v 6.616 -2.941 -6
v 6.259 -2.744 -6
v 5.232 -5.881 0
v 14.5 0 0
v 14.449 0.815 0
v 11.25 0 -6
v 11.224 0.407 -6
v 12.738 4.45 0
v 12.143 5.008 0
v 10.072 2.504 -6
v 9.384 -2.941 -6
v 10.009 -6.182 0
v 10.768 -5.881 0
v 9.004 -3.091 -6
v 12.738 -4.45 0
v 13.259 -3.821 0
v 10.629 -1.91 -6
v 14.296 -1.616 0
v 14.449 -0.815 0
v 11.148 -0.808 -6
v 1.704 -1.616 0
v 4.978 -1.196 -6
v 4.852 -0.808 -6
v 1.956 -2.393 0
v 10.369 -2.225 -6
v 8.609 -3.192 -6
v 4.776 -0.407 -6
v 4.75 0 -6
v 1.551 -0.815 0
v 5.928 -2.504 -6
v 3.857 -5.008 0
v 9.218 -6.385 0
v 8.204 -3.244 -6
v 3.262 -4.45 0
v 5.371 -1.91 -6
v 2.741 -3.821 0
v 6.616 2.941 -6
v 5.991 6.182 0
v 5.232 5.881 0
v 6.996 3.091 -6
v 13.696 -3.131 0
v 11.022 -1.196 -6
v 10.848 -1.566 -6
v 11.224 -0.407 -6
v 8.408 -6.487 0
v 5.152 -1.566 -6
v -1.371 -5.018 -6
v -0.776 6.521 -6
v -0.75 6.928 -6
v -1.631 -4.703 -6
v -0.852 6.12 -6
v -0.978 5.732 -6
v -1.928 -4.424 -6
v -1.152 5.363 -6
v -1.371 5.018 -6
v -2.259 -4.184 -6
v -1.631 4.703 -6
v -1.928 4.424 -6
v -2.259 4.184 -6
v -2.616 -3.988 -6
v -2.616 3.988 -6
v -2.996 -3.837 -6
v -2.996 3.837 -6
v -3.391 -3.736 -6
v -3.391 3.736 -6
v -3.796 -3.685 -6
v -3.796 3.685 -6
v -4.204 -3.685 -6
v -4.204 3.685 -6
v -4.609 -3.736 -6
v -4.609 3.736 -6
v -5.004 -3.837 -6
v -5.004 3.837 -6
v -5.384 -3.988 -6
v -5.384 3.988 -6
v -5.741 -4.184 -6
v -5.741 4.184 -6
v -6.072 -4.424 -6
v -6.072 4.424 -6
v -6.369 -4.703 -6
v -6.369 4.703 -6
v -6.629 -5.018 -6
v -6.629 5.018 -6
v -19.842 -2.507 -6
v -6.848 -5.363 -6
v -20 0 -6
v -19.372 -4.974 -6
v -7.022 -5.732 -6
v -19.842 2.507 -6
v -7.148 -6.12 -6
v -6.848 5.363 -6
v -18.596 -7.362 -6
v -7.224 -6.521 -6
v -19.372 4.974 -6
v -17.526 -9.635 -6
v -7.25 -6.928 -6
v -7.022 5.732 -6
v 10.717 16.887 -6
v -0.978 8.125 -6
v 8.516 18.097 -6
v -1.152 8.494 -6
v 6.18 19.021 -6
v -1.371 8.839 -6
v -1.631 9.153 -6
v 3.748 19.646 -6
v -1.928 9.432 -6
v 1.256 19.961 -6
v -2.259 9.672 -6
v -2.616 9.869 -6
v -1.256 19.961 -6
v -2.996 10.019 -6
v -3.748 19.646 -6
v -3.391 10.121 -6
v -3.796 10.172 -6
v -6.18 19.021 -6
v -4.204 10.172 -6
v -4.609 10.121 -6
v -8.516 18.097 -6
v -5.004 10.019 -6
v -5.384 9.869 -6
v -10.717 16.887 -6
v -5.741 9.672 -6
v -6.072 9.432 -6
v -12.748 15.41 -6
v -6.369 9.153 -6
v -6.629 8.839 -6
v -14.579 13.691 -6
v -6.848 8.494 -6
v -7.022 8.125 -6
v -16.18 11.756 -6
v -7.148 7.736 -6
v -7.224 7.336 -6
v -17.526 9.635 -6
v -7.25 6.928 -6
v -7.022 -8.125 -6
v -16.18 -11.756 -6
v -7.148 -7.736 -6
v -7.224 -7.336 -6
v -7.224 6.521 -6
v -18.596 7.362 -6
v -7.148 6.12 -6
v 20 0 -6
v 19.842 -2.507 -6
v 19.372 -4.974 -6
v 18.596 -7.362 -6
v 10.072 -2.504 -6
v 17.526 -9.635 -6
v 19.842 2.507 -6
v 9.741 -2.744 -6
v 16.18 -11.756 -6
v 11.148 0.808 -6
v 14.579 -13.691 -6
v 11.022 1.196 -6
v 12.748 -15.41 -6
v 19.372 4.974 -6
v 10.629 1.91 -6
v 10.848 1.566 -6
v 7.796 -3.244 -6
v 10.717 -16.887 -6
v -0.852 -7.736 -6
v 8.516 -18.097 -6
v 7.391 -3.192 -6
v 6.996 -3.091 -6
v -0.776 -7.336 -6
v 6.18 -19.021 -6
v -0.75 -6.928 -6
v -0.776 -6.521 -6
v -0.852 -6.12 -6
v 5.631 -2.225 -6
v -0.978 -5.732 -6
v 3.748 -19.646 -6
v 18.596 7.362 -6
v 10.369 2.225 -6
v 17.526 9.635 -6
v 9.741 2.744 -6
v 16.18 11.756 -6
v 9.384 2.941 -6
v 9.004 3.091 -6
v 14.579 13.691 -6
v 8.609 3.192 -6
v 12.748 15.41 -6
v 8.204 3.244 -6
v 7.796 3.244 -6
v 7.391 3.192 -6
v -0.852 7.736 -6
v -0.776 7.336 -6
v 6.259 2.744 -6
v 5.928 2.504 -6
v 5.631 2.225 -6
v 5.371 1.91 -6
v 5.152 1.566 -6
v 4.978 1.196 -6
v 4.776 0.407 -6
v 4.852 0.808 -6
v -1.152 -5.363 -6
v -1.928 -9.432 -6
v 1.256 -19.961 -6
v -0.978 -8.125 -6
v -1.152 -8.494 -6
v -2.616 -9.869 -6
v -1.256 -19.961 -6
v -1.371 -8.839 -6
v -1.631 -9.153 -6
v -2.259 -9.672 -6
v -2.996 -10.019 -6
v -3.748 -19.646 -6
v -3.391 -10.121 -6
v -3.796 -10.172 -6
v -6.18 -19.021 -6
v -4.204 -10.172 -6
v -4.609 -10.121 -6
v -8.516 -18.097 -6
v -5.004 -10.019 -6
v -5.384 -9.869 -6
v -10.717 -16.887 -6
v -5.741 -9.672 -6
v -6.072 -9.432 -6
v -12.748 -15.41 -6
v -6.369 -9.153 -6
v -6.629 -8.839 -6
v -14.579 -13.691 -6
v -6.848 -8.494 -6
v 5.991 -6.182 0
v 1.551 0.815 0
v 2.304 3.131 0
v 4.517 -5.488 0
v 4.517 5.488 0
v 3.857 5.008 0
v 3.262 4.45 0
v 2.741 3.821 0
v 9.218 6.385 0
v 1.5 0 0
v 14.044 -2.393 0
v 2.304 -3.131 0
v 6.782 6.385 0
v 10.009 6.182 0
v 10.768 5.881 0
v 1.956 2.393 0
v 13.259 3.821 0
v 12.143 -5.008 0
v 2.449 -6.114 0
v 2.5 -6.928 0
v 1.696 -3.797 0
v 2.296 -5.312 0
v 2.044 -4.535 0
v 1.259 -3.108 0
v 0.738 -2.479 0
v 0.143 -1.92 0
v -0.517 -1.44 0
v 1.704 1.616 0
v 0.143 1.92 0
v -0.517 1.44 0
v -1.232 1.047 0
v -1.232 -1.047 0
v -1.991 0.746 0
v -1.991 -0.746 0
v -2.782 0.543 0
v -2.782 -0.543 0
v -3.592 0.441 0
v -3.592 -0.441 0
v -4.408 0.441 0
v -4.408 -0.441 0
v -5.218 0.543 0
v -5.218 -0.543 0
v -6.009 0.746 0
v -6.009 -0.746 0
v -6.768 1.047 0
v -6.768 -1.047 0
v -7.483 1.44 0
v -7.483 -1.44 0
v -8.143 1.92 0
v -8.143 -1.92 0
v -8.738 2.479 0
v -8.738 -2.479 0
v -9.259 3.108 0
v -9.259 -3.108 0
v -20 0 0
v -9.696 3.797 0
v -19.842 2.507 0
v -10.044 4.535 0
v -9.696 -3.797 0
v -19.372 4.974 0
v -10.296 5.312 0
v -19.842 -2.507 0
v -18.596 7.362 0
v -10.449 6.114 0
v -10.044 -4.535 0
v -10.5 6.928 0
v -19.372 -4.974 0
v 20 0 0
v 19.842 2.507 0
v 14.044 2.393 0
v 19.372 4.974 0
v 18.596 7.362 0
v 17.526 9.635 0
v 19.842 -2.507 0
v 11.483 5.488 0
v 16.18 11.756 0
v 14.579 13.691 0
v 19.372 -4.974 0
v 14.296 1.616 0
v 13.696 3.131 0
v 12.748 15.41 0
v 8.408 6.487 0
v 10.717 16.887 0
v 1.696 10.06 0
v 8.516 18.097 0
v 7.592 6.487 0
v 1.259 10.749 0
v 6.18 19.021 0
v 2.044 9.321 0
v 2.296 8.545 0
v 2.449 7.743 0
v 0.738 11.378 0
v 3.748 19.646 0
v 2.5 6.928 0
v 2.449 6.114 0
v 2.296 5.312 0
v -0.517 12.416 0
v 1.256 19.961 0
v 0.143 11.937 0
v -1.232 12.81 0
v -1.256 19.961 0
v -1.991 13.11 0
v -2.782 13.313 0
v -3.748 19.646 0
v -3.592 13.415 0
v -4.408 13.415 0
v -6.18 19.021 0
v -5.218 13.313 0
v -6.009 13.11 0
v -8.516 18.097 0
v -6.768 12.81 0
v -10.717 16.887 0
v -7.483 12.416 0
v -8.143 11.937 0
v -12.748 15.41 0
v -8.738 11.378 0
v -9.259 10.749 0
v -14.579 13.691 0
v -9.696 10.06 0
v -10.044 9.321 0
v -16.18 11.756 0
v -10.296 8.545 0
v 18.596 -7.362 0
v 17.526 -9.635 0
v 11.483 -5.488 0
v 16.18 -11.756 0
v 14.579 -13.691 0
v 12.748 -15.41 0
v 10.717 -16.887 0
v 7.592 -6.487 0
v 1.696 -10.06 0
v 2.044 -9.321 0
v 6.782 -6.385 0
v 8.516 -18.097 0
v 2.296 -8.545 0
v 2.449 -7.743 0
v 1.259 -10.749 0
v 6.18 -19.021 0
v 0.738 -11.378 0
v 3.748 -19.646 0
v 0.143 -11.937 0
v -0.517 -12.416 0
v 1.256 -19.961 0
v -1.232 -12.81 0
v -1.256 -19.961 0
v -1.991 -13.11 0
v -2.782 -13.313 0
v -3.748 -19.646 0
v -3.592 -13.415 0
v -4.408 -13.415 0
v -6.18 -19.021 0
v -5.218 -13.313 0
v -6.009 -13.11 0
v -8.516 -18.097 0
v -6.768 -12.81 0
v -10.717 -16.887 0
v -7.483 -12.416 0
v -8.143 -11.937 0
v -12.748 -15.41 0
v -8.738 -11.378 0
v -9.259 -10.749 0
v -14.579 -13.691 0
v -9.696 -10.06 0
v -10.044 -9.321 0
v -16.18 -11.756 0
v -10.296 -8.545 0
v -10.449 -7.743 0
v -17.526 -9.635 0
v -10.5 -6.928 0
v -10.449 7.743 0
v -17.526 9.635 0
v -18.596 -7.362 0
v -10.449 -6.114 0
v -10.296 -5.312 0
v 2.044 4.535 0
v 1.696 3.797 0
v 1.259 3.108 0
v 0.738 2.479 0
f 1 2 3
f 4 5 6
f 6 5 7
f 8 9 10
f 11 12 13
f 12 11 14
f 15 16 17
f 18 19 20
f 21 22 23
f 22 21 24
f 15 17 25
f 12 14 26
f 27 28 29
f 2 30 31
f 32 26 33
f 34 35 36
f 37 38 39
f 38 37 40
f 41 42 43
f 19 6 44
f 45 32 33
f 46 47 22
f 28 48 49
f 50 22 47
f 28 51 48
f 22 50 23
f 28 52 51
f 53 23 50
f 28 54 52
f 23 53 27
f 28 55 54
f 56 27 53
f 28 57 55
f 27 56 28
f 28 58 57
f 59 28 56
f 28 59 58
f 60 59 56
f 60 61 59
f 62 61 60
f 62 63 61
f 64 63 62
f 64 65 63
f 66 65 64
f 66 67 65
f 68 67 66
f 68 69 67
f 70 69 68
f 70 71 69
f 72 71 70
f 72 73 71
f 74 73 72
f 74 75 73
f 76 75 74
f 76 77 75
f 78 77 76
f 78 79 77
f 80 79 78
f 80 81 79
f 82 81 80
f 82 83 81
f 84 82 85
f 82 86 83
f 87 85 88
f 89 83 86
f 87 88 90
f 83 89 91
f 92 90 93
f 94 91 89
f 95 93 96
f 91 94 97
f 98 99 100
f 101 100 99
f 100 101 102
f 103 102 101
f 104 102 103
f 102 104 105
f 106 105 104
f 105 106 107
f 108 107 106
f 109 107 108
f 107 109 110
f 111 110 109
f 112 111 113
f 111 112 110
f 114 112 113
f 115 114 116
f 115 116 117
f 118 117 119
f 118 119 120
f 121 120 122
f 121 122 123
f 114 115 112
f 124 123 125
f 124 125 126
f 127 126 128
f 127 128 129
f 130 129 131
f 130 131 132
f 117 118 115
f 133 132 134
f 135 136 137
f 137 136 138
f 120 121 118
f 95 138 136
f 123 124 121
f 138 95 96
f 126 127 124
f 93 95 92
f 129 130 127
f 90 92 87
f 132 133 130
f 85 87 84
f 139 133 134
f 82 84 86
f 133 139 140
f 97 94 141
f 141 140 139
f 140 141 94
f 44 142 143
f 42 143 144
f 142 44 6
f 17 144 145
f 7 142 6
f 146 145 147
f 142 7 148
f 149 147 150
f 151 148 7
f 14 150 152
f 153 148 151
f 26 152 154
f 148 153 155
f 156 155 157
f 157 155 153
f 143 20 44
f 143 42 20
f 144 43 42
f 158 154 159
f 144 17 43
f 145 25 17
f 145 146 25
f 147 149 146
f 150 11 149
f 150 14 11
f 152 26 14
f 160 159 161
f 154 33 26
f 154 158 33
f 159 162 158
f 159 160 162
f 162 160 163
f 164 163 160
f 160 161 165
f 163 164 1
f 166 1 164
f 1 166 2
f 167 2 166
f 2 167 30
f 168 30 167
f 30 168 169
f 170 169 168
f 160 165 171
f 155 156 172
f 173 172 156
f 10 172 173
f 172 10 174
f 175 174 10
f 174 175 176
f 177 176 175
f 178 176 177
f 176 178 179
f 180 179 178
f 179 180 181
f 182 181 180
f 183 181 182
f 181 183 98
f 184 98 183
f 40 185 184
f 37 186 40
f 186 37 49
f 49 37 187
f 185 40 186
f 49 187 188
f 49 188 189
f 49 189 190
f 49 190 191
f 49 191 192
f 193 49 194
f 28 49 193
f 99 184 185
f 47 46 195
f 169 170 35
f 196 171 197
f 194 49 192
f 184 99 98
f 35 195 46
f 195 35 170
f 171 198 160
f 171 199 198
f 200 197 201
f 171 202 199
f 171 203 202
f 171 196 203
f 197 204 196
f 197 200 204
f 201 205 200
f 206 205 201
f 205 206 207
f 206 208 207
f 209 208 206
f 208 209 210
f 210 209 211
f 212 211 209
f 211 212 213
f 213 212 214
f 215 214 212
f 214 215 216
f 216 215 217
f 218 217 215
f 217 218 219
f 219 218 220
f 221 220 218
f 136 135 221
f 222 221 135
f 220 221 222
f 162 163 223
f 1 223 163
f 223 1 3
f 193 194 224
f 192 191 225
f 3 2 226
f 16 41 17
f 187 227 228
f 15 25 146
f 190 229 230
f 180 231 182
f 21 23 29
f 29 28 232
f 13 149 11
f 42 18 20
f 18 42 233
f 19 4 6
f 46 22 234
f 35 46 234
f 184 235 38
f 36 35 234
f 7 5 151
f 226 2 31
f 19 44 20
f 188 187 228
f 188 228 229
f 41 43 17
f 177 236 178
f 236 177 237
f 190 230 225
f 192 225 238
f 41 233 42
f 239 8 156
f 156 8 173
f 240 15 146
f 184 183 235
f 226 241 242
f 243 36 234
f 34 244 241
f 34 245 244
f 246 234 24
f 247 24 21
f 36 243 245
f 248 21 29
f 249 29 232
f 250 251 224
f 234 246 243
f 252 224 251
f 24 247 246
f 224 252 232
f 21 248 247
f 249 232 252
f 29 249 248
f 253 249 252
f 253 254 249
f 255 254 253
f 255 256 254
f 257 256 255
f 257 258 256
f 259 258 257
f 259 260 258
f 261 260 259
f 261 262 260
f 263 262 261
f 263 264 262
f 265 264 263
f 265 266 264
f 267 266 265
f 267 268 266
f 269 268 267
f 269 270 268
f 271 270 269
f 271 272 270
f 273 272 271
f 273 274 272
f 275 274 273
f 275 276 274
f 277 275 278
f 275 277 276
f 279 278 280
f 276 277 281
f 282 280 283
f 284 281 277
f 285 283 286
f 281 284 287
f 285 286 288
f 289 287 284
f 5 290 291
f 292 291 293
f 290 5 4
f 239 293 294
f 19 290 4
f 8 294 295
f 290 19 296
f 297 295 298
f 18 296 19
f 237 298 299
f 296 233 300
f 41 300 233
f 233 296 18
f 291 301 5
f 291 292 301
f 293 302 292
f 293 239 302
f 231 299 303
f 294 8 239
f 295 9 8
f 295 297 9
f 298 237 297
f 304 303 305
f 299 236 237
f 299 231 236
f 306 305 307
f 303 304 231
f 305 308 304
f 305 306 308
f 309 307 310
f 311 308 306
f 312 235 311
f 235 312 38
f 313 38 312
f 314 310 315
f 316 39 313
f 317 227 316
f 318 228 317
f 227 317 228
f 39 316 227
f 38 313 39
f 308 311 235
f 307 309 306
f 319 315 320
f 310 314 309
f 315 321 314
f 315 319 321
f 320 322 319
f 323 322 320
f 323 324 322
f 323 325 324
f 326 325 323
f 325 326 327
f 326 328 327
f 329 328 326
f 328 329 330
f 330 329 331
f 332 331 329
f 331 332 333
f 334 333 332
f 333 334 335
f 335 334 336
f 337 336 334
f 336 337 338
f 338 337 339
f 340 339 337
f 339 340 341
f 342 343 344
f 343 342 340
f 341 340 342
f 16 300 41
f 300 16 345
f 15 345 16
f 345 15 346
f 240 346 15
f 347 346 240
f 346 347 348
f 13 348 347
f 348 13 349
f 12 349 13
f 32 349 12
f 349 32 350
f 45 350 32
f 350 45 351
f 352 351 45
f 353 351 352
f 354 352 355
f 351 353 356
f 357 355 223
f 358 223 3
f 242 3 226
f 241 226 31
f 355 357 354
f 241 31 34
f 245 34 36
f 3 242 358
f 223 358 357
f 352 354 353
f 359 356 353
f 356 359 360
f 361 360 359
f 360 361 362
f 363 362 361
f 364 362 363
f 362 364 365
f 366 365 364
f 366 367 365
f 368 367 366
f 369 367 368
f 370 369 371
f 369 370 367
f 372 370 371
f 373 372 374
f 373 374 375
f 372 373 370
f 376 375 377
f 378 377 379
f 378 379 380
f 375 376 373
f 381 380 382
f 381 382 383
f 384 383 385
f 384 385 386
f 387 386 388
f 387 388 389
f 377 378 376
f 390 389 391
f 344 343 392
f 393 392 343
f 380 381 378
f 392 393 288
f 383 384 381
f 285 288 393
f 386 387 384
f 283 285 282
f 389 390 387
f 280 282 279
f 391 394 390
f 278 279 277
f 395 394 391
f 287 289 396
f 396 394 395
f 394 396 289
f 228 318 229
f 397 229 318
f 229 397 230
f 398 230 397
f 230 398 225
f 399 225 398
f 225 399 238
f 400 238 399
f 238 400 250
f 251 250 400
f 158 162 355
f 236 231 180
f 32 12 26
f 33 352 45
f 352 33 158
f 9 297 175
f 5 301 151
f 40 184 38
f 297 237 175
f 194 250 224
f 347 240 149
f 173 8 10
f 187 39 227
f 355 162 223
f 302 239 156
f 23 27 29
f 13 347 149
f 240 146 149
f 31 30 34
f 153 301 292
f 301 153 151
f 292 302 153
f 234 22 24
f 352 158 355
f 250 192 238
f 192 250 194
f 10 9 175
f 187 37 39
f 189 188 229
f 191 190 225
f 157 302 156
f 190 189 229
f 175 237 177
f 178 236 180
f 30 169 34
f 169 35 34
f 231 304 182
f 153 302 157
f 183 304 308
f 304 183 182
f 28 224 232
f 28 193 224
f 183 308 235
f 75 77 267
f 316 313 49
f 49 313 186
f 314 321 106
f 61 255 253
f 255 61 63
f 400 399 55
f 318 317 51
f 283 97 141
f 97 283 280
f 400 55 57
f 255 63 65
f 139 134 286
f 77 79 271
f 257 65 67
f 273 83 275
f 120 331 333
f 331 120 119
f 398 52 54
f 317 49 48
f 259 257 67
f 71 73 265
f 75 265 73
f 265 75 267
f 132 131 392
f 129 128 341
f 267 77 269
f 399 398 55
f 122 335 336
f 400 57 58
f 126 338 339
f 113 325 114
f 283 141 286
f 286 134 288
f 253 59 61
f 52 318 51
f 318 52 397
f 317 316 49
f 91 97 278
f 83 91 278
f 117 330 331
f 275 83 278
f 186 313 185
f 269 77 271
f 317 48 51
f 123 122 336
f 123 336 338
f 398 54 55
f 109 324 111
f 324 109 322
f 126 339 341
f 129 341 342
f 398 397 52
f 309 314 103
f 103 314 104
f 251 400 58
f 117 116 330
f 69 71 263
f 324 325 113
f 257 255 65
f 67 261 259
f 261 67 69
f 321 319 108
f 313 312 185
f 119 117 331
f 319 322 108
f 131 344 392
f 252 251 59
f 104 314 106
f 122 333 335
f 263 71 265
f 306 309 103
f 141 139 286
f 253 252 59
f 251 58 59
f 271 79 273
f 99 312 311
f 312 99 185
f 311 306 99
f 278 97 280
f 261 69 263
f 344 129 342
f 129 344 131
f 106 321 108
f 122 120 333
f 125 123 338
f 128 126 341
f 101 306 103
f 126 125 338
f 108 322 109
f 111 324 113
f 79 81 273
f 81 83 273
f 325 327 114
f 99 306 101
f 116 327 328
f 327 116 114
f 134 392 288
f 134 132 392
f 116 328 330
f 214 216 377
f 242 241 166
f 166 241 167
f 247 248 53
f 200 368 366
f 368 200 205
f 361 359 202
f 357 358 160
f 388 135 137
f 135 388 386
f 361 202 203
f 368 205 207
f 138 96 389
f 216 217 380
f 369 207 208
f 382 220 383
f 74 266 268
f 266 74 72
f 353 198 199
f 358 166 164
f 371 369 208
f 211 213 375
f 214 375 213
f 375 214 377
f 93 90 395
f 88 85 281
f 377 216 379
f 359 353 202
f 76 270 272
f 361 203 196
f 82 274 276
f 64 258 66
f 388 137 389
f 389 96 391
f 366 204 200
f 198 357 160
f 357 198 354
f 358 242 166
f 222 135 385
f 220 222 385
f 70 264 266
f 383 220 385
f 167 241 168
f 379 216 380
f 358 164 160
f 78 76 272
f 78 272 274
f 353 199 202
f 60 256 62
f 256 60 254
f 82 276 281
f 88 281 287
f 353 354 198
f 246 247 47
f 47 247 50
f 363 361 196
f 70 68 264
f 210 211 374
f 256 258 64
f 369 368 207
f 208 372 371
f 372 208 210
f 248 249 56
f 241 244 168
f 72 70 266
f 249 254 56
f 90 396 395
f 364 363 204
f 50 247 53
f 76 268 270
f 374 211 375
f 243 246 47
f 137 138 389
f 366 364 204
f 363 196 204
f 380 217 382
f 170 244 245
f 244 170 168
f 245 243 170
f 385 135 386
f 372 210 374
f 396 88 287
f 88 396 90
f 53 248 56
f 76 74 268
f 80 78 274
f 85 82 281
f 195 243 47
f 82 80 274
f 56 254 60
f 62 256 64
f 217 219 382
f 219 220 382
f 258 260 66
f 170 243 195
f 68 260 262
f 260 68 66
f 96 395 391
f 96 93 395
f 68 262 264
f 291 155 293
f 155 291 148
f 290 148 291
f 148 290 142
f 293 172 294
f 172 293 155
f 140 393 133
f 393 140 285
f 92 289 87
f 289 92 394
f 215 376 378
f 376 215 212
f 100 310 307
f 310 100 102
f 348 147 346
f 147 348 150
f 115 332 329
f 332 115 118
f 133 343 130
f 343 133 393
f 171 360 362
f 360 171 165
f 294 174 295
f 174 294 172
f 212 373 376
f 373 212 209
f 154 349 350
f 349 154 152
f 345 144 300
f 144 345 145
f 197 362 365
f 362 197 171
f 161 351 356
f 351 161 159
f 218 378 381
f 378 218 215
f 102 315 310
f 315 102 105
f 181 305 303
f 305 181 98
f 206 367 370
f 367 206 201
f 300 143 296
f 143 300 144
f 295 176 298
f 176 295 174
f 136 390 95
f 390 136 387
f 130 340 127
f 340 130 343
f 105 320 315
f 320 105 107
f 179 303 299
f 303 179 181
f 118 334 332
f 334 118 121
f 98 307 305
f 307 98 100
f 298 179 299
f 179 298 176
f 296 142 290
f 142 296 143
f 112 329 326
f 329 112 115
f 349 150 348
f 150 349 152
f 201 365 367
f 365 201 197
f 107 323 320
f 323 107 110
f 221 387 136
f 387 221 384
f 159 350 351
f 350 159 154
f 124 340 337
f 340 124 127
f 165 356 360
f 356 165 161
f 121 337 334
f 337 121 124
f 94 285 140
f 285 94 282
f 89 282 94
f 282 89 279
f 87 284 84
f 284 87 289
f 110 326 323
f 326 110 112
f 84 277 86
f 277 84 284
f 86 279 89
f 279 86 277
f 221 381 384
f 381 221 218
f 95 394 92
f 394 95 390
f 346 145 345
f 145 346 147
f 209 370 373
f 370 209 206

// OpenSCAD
$fn = 50;


difference() {
	union() {
		cylinder(h = 0, r = 12.5000000000);
		translate(v = [0, 0, -6.0000000000]) {
			cylinder(h = 6, r = 20.0000000000);
		}
	}
	union() {
		translate(v = [8.0000000000, 0.0000000000, 0]) {
			rotate(a = [0, 0, 0]) {
				difference() {
					union() {
						#cylinder(h = 0, r = 2.2500000000);
						#translate(v = [0, 0, -6]) {
							cylinder(h = 6, r = 12.5000000000, r1 = 3.2500000000, r2 = 6.5000000000);
						}
						#cylinder(h = 0, r = 3.2500000000);
						#cylinder(h = 0, r = 2.2500000000);
					}
					union();
				}
			}
		}
		translate(v = [-4.0000000000, 6.9282032303, 0]) {
			rotate(a = [0, 0, 0]) {
				difference() {
					union() {
						#cylinder(h = 0, r = 2.2500000000);
						#translate(v = [0, 0, -6]) {
							cylinder(h = 6, r = 12.5000000000, r1 = 3.2500000000, r2 = 6.5000000000);
						}
						#cylinder(h = 0, r = 3.2500000000);
						#cylinder(h = 0, r = 2.2500000000);
					}
					union();
				}
			}
		}
		translate(v = [-4.0000000000, -6.9282032303, 0]) {
			rotate(a = [0, 0, 0]) {
				difference() {
					union() {
						#cylinder(h = 0, r = 2.2500000000);
						#translate(v = [0, 0, -6]) {
							cylinder(h = 6, r = 12.5000000000, r1 = 3.2500000000, r2 = 6.5000000000);
						}
						#cylinder(h = 0, r = 3.2500000000);
						#cylinder(h = 0, r = 2.2500000000);
					}
					union();
				}
			}
		}
	}
}
